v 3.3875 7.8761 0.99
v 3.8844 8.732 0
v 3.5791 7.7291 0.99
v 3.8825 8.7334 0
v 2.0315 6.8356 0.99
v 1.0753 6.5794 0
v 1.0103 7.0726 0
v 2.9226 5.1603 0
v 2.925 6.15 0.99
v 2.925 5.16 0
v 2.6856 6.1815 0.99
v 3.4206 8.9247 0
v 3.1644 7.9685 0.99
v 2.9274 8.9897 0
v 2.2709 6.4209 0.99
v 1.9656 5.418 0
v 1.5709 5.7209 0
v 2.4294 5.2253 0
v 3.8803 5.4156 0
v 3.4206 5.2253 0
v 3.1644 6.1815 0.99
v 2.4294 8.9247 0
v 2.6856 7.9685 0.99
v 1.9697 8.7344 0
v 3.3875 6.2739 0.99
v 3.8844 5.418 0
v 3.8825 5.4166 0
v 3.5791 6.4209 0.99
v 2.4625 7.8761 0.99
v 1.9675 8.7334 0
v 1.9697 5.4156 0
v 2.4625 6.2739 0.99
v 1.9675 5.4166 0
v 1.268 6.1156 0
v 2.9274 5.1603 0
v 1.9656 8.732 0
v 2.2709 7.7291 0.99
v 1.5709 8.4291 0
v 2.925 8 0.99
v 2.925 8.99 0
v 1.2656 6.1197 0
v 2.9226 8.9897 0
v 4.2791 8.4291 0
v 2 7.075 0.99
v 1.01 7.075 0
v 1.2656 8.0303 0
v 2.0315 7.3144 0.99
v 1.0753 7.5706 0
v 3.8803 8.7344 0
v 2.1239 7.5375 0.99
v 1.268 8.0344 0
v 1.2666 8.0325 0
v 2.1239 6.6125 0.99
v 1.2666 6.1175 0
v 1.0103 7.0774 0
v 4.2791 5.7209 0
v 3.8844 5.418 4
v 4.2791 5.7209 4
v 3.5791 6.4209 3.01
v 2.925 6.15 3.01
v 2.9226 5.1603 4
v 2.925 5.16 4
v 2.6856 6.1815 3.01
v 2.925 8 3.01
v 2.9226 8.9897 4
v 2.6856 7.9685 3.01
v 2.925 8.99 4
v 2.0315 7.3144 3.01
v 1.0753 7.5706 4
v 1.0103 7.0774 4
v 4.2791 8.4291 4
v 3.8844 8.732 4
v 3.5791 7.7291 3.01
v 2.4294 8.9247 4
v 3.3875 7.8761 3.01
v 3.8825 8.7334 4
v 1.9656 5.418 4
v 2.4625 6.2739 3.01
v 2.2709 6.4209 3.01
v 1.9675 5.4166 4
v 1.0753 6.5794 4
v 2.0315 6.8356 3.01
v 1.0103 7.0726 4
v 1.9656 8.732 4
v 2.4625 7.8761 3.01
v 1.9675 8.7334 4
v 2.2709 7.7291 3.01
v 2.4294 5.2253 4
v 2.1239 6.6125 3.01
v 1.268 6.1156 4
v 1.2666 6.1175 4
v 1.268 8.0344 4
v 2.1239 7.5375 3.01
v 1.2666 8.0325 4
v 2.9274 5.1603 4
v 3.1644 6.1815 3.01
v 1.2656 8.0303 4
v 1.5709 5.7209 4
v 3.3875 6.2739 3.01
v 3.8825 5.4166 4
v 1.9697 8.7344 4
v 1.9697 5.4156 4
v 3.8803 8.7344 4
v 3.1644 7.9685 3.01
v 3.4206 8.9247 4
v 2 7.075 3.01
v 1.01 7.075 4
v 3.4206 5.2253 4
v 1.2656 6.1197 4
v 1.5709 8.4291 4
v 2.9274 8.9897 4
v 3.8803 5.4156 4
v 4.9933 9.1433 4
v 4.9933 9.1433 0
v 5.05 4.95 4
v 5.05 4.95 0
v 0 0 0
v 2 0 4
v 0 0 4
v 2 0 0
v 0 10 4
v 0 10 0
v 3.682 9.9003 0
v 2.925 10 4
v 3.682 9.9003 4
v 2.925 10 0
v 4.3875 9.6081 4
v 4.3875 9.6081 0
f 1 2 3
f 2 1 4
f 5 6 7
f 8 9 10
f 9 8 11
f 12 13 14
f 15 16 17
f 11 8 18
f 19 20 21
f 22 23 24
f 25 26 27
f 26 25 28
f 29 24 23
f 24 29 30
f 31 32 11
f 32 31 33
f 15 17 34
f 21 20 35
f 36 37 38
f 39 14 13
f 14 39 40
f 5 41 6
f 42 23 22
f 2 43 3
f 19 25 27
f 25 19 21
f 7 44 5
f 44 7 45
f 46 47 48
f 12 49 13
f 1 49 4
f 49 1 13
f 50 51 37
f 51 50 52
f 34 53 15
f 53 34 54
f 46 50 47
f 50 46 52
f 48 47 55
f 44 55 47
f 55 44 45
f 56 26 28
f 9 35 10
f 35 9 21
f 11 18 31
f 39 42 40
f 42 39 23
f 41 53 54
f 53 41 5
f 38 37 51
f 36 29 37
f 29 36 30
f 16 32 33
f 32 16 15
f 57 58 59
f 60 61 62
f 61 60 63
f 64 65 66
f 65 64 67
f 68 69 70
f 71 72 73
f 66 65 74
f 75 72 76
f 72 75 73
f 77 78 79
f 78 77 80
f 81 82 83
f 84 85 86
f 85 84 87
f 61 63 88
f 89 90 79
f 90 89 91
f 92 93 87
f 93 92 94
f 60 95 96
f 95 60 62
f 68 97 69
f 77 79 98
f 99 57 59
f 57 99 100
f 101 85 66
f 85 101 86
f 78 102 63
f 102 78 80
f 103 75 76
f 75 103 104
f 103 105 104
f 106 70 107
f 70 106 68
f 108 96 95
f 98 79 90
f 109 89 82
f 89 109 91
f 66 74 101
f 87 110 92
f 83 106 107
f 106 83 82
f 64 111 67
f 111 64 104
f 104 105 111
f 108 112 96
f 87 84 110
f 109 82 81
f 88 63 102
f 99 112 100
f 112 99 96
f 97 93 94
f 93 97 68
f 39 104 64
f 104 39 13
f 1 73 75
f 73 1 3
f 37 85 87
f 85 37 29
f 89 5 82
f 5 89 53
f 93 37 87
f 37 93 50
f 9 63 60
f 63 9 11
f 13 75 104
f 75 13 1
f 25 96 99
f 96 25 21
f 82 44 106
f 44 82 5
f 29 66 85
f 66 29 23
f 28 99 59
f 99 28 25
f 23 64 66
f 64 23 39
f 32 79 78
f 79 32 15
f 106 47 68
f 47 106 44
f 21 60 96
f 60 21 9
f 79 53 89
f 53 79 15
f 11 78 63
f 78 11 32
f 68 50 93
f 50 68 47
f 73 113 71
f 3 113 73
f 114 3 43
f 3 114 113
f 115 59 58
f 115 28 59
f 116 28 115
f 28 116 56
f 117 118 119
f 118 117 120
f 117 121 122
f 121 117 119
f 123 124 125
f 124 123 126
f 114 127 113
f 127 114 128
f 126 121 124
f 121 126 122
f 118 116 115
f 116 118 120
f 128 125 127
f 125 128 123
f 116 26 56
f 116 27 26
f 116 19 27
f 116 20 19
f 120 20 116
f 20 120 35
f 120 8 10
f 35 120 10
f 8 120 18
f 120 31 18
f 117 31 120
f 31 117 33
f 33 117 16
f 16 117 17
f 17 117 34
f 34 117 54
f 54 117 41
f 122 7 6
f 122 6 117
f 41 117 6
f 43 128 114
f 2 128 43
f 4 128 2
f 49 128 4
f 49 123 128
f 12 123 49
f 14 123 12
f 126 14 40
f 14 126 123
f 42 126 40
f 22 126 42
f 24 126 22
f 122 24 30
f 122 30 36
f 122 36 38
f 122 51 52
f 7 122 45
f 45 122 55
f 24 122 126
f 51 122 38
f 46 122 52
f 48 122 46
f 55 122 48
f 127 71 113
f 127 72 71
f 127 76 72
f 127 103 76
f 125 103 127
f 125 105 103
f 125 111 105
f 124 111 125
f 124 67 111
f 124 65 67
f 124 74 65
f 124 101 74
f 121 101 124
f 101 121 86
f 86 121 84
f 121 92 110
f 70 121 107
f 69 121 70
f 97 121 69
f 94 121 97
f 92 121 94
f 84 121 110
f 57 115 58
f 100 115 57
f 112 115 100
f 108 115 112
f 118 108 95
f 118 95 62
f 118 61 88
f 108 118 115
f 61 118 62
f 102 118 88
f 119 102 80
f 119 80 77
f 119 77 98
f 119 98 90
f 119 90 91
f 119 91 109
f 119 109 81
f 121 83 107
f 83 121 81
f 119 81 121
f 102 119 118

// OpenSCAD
$fn = 24;

default_filament_diameter = 1.75 + 0.1;
default_extrude_depth = 4;
default_shell_thickness = 2;
default_bevel_radius = 1;

filament_jaw();

module filament_jaw(
    filament_diameter = default_filament_diameter,
    extrude_depth = default_extrude_depth,
    shell_thickness = default_shell_thickness,
    bevel_radius = default_bevel_radius,
    wall_size = 10)
{
    filament_jaw_od = filament_diameter + (shell_thickness * 2);
    filament_jaw_or = filament_jaw_od / 2; 
    filament_jaw_id = filament_diameter;
    filament_jaw_ir = filament_jaw_id / 2;

    translate([filament_jaw_or, wall_size - filament_jaw_or, 0])
    difference()
    {
        body();
        hole();
    }

    module body()
    {
        hull()
        {
            translate([
                -filament_jaw_or,
                filament_jaw_or - wall_size,
                0])
            cube([
                shell_thickness,
                wall_size,
                extrude_depth]);

            cylinder(
                r = filament_jaw_or, 
                h = extrude_depth);
        }
        
    }

    module hole()
    {
        translate([0, 0, -0.01])
        cylinder(
            r1 = filament_jaw_ir + bevel_radius,
            r2 = filament_jaw_ir, 
            h = bevel_radius);

        translate([0, 0, extrude_depth - bevel_radius + 0.01])
        cylinder(
            r1 = filament_jaw_ir,
            r2 = filament_jaw_ir  + bevel_radius, 
            h = bevel_radius);

        translate([0, 0, -1])
        cylinder(
            r = filament_jaw_ir, 
            h = extrude_depth + 2);

        rotate(180,0,0)
        translate([-filament_jaw_or, 0, -1])        
        cylinder(
            r = filament_jaw_or, 
            h = extrude_depth + 2,
            $fn = 4);
    }
}
